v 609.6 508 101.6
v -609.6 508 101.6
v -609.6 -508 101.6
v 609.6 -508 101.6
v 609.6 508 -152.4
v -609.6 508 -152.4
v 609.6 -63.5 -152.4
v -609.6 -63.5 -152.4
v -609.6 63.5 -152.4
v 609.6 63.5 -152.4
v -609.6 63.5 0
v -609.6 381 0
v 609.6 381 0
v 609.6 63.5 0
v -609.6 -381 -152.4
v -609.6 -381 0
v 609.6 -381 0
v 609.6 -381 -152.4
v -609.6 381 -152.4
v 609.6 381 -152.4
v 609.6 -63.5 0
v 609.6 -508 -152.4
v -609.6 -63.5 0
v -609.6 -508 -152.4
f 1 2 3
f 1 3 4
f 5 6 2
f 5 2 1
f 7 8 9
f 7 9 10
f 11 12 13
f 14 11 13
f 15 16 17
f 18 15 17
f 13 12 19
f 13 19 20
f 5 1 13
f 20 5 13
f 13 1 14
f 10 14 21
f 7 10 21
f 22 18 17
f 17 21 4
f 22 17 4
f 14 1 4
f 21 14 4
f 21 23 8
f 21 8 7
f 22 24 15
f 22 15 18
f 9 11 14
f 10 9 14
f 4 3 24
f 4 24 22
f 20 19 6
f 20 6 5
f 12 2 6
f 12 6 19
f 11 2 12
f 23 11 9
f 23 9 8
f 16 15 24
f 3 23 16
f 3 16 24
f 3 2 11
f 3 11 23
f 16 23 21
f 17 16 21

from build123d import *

# Parameters (mm, degrees)
F0_W     = 1219.2
F0_H     = 1016
F1_DEPTH = 101.6
F2_W     = 1219.2
F2_H     = 127
F3_DEPTH = 152.4


with BuildPart() as f1:
    # F0 (on Top) → F1 (new body)
    with BuildSketch(Plane.XY):
        Rectangle(F0_W, F0_H)
    extrude(amount=F1_DEPTH)

    # F2 (on face) → F3 (join)
    with BuildSketch(Plane(origin=(0, 0, 0), x_dir=(1, 0, 0), z_dir=(0, 0, -1))):
        with Locations((0, 444.5)):
            Rectangle(F2_W, F2_H)
        with Locations((0, -444.5)):
            Rectangle(F2_W, F2_H)
        Rectangle(F2_W, F2_H)
    extrude(amount=F3_DEPTH)


solid = f1.part
